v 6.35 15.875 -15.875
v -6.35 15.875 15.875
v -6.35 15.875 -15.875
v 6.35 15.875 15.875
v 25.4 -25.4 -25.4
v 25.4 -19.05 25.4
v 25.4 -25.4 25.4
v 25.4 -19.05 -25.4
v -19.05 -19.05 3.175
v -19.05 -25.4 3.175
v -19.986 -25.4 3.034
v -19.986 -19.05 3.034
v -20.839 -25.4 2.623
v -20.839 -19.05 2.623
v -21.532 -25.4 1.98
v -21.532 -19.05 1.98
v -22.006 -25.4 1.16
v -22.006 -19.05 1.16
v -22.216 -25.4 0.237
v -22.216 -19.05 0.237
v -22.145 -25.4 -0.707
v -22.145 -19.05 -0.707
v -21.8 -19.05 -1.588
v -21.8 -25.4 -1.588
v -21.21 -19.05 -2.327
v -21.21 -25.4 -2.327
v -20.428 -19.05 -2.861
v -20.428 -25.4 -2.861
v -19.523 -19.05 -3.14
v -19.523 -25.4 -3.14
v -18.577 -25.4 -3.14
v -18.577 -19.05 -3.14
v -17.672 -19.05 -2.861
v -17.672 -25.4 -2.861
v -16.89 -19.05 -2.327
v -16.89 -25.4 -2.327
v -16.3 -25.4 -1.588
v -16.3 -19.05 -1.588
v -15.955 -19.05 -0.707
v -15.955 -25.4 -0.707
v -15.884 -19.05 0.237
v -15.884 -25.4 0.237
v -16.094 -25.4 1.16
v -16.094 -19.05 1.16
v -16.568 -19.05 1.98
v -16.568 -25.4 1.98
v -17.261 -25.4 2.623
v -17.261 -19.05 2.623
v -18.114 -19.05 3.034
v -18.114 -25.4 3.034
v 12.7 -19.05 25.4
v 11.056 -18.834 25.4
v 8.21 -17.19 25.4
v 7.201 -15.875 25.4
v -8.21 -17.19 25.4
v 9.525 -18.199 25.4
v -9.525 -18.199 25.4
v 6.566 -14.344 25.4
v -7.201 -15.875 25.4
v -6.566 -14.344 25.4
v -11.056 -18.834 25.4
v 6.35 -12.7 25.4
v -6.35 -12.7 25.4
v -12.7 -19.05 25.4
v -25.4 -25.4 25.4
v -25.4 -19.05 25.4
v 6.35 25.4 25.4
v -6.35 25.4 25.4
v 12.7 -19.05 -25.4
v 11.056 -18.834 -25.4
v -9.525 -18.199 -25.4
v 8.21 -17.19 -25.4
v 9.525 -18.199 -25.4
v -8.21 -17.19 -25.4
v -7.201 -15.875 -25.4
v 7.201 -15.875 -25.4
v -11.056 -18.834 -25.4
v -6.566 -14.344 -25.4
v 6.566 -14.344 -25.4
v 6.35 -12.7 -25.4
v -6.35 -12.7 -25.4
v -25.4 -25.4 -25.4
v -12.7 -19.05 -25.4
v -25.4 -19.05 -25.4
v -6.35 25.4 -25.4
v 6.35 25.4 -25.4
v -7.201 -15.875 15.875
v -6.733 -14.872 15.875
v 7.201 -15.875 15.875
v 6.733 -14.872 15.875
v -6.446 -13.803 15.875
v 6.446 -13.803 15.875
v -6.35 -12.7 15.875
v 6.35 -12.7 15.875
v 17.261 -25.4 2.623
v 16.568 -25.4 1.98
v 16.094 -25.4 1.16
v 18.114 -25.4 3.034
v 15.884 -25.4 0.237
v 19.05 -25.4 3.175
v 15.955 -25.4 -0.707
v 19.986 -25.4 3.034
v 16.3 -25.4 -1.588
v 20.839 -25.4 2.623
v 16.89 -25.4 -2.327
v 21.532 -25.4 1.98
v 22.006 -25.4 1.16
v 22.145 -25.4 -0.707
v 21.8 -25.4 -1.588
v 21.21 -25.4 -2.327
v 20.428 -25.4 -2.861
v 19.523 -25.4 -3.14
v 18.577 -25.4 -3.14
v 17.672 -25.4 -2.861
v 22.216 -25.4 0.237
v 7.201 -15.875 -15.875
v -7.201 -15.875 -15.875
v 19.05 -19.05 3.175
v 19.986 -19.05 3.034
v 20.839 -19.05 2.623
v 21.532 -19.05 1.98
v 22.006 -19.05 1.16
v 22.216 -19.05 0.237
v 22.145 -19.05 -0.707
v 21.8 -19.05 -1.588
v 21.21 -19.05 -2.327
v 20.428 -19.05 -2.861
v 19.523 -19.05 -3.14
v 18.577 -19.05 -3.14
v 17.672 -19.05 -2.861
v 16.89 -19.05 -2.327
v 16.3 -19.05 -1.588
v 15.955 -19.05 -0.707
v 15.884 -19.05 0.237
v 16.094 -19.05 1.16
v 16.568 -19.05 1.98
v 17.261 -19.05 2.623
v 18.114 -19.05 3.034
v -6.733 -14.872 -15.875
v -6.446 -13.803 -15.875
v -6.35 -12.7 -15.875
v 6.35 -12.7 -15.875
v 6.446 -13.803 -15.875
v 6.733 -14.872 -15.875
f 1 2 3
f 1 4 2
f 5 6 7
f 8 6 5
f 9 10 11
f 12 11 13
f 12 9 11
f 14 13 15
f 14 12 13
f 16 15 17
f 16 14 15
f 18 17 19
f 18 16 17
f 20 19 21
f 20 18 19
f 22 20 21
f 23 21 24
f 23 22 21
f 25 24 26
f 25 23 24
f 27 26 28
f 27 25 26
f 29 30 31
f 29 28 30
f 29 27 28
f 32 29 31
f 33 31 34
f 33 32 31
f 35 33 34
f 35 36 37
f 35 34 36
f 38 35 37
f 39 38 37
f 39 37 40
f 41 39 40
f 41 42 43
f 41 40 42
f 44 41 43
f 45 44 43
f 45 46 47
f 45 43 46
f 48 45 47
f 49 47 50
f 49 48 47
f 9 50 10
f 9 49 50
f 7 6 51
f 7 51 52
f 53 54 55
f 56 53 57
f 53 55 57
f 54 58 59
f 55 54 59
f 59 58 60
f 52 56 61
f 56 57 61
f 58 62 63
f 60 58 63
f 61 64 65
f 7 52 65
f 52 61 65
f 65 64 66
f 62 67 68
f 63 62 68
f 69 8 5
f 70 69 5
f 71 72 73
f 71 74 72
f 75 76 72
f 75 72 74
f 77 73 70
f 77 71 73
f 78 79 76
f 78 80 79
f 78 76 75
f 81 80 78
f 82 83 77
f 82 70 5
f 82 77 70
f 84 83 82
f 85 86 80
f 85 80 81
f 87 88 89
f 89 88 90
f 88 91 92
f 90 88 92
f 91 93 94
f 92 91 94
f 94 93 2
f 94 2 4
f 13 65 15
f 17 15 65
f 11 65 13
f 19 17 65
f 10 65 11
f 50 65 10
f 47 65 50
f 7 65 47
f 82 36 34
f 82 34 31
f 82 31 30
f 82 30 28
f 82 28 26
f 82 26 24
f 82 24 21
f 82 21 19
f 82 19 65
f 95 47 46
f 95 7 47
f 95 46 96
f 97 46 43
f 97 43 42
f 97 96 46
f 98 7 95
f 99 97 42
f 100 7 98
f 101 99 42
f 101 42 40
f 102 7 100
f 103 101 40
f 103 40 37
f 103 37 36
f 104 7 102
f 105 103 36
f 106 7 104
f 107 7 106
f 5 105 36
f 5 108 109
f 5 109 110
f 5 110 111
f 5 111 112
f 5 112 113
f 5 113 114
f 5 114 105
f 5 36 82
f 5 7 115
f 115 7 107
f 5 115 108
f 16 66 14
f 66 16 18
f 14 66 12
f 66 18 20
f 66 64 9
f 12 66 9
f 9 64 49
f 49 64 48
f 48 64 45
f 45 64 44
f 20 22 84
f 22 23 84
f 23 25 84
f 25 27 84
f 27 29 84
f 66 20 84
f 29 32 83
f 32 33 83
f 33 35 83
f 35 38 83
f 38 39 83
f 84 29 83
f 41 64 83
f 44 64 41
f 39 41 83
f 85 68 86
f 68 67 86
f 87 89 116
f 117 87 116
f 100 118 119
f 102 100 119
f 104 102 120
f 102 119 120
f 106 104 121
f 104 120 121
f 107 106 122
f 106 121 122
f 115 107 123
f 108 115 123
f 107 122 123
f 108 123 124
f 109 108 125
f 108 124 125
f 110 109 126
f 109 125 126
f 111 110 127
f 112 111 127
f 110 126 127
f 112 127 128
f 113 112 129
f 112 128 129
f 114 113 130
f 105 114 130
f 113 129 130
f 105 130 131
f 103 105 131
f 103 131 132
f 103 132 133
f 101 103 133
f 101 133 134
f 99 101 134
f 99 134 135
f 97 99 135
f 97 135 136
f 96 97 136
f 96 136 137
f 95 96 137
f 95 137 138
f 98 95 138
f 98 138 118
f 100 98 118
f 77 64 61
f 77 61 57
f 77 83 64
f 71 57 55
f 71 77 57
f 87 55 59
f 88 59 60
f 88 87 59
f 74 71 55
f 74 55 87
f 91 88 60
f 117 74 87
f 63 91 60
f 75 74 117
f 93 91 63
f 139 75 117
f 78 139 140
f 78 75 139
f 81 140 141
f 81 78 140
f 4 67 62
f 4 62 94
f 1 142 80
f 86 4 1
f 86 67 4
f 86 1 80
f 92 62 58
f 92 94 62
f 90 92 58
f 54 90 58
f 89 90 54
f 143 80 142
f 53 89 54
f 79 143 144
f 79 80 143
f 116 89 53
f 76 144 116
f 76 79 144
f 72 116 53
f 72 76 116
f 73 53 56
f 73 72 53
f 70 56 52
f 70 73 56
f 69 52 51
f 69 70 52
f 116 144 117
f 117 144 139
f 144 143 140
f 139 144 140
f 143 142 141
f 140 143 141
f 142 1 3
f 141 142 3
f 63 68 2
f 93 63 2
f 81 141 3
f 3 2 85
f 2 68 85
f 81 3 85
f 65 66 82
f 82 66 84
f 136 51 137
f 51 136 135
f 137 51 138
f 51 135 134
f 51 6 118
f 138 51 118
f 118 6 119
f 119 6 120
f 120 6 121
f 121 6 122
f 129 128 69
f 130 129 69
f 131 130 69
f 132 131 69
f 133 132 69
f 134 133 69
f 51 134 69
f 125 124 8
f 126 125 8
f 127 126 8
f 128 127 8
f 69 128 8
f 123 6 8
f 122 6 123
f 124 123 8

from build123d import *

# Parameters (mm, degrees)
SKETCH1_W           = 50.8
SKETCH1_H           = 50.8
SKETCH1_W_2         = 31.75
SKETCH1_H_2         = 31.75
BOSS_EXTRUDE1_DEPTH = 6.35
SKETCH2_W           = 50.8
SKETCH2_H           = 6.35
BOSS_EXTRUDE2_DEPTH = 25.4
FILLET1_R           = 6.35
SKETCH3_R           = 3.175
CUT_EXTRUDE1_DEPTH  = 58.15


with BuildPart() as part:
    # Sketch1 → Boss-Extrude1 (new, symmetric)
    with BuildSketch(Plane(origin=(0, 0, 0), x_dir=(0, 0, -1), z_dir=(1, 0, 0))):
        Rectangle(SKETCH1_W, SKETCH1_H)
        Rectangle(SKETCH1_W_2, SKETCH1_H_2, mode=Mode.SUBTRACT)
    extrude(amount=BOSS_EXTRUDE1_DEPTH, both=True)

    # Sketch2 → Boss-Extrude2 (add, symmetric)
    with BuildSketch(Plane(origin=(0, 0, 0), x_dir=(0, 0, -1), z_dir=(1, 0, 0))):
        with Locations((0, -22.225)):
            Rectangle(SKETCH2_W, SKETCH2_H)
    extrude(amount=BOSS_EXTRUDE2_DEPTH, both=True)

    # Fillet1
    # the kernel refuses this fillet: 6.35 mm, written as the material it adds along each edge
    with BuildSketch(Plane(origin=(-6.35, -19.05, -25.4), x_dir=(0, 1, 0), z_dir=(0, 0, 1))) as fillet1_piece_1_section:
        with BuildLine():
            CenterArc((FILLET1_R, FILLET1_R), FILLET1_R, 180, 90)
            Line((0, FILLET1_R), (0, 0))
            Line((0, 0), (FILLET1_R, 0))
        make_face()
    fillet1_piece_1 = extrude(amount=50.8, mode=Mode.PRIVATE)
    fillet1_piece_1 = split(fillet1_piece_1, bisect_by=Plane(origin=(-6.502453224, -14.838357518, -15.875), z_dir=(0, 0, -1)), keep=Keep.TOP, mode=Mode.PRIVATE)
    fillet1_piece_1 = split(fillet1_piece_1, bisect_by=Plane(origin=(-6.502453224, -15.875, -20.6375), z_dir=(0, 1, 0)), keep=Keep.TOP, mode=Mode.PRIVATE)
    add(fillet1_piece_1)
    with BuildSketch(Plane(origin=(-6.35, -19.05, -25.4), x_dir=(0, 1, 0), z_dir=(0, 0, 1))) as fillet1_piece_2_section:
        with BuildLine():
            CenterArc((FILLET1_R, FILLET1_R), FILLET1_R, 180, 90)
            Line((0, FILLET1_R), (0, 0))
            Line((0, 0), (FILLET1_R, 0))
        make_face()
    fillet1_piece_2 = extrude(amount=50.8, mode=Mode.PRIVATE)
    fillet1_piece_2 = split(fillet1_piece_2, bisect_by=Plane(origin=(-7.970012381, -18.006112297, -15.875), z_dir=(0, 0, -1)), keep=Keep.TOP, mode=Mode.PRIVATE)
    fillet1_piece_2 = split(fillet1_piece_2, bisect_by=Plane(origin=(-7.970012381, -15.875, -20.6375), z_dir=(0, -1, 0)), keep=Keep.TOP, mode=Mode.PRIVATE)
    add(fillet1_piece_2)
    with BuildSketch(Plane(origin=(-6.35, -19.05, -25.4), x_dir=(0, 1, 0), z_dir=(0, 0, 1))) as fillet1_piece_3_section:
        with BuildLine():
            CenterArc((FILLET1_R, FILLET1_R), FILLET1_R, 180, 90)
            Line((0, FILLET1_R), (0, 0))
            Line((0, 0), (FILLET1_R, 0))
        make_face()
    fillet1_piece_3 = extrude(amount=50.8, mode=Mode.PRIVATE)
    fillet1_piece_3 = split(fillet1_piece_3, bisect_by=Plane(origin=(-7.970012381, -18.006112297, -15.875), z_dir=(0, 0, 1)), keep=Keep.TOP, mode=Mode.PRIVATE)
    fillet1_piece_3 = split(fillet1_piece_3, bisect_by=Plane(origin=(-7.970012381, -15.875, 0), z_dir=(0, -1, 0)), keep=Keep.TOP, mode=Mode.PRIVATE)
    fillet1_piece_3 = split(fillet1_piece_3, bisect_by=Plane(origin=(-7.970012381, -18.006112297, 15.875), z_dir=(0, 0, -1)), keep=Keep.TOP, mode=Mode.PRIVATE)
    add(fillet1_piece_3)
    with BuildSketch(Plane(origin=(-6.35, -19.05, -25.4), x_dir=(0, 1, 0), z_dir=(0, 0, 1))) as fillet1_piece_4_section:
        with BuildLine():
            CenterArc((FILLET1_R, FILLET1_R), FILLET1_R, 180, 90)
            Line((0, FILLET1_R), (0, 0))
            Line((0, 0), (FILLET1_R, 0))
        make_face()
    fillet1_piece_4 = extrude(amount=50.8, mode=Mode.PRIVATE)
    fillet1_piece_4 = split(fillet1_piece_4, bisect_by=Plane(origin=(-6.502453224, -15.875, 20.6375), z_dir=(0, 1, 0)), keep=Keep.TOP, mode=Mode.PRIVATE)
    fillet1_piece_4 = split(fillet1_piece_4, bisect_by=Plane(origin=(-6.502453224, -14.838357518, 15.875), z_dir=(0, 0, 1)), keep=Keep.TOP, mode=Mode.PRIVATE)
    add(fillet1_piece_4)
    with BuildSketch(Plane(origin=(-6.35, -19.05, -25.4), x_dir=(0, 1, 0), z_dir=(0, 0, 1))) as fillet1_piece_5_section:
        with BuildLine():
            CenterArc((FILLET1_R, FILLET1_R), FILLET1_R, 180, 90)
            Line((0, FILLET1_R), (0, 0))
            Line((0, 0), (FILLET1_R, 0))
        make_face()
    fillet1_piece_5 = extrude(amount=50.8, mode=Mode.PRIVATE)
    fillet1_piece_5 = split(fillet1_piece_5, bisect_by=Plane(origin=(-7.970012381, -15.875, 20.6375), z_dir=(0, -1, 0)), keep=Keep.TOP, mode=Mode.PRIVATE)
    fillet1_piece_5 = split(fillet1_piece_5, bisect_by=Plane(origin=(-7.970012381, -18.006112297, 15.875), z_dir=(0, 0, 1)), keep=Keep.TOP, mode=Mode.PRIVATE)
    add(fillet1_piece_5)
    with BuildSketch(Plane(origin=(6.35, -19.05, -25.4), x_dir=(1, 0, 0), z_dir=(0, 0, 1))) as fillet1_piece_6_section:
        with BuildLine():
            CenterArc((FILLET1_R, FILLET1_R), FILLET1_R, 180, 90)
            Line((0, FILLET1_R), (0, 0))
            Line((0, 0), (FILLET1_R, 0))
        make_face()
    fillet1_piece_6 = extrude(amount=50.8, mode=Mode.PRIVATE)
    fillet1_piece_6 = split(fillet1_piece_6, bisect_by=Plane(origin=(7.970012381, -15.875, -20.6375), z_dir=(0, -1, 0)), keep=Keep.TOP, mode=Mode.PRIVATE)
    fillet1_piece_6 = split(fillet1_piece_6, bisect_by=Plane(origin=(7.970012381, -18.006112297, -15.875), z_dir=(0, 0, -1)), keep=Keep.TOP, mode=Mode.PRIVATE)
    add(fillet1_piece_6)
    with BuildSketch(Plane(origin=(6.35, -19.05, -25.4), x_dir=(1, 0, 0), z_dir=(0, 0, 1))) as fillet1_piece_7_section:
        with BuildLine():
            CenterArc((FILLET1_R, FILLET1_R), FILLET1_R, 180, 90)
            Line((0, FILLET1_R), (0, 0))
            Line((0, 0), (FILLET1_R, 0))
        make_face()
    fillet1_piece_7 = extrude(amount=50.8, mode=Mode.PRIVATE)
    fillet1_piece_7 = split(fillet1_piece_7, bisect_by=Plane(origin=(6.502453224, -15.875, -20.6375), z_dir=(0, 1, 0)), keep=Keep.TOP, mode=Mode.PRIVATE)
    fillet1_piece_7 = split(fillet1_piece_7, bisect_by=Plane(origin=(6.502453224, -14.838357518, -15.875), z_dir=(0, 0, -1)), keep=Keep.TOP, mode=Mode.PRIVATE)
    add(fillet1_piece_7)
    with BuildSketch(Plane(origin=(6.35, -19.05, -25.4), x_dir=(1, 0, 0), z_dir=(0, 0, 1))) as fillet1_piece_8_section:
        with BuildLine():
            CenterArc((FILLET1_R, FILLET1_R), FILLET1_R, 180, 90)
            Line((0, FILLET1_R), (0, 0))
            Line((0, 0), (FILLET1_R, 0))
        make_face()
    fillet1_piece_8 = extrude(amount=50.8, mode=Mode.PRIVATE)
    fillet1_piece_8 = split(fillet1_piece_8, bisect_by=Plane(origin=(7.970012381, -18.006112297, 15.875), z_dir=(0, 0, -1)), keep=Keep.TOP, mode=Mode.PRIVATE)
    fillet1_piece_8 = split(fillet1_piece_8, bisect_by=Plane(origin=(7.970012381, -15.875, 0), z_dir=(0, -1, 0)), keep=Keep.TOP, mode=Mode.PRIVATE)
    fillet1_piece_8 = split(fillet1_piece_8, bisect_by=Plane(origin=(7.970012381, -18.006112297, -15.875), z_dir=(0, 0, 1)), keep=Keep.TOP, mode=Mode.PRIVATE)
    add(fillet1_piece_8)
    with BuildSketch(Plane(origin=(6.35, -19.05, -25.4), x_dir=(1, 0, 0), z_dir=(0, 0, 1))) as fillet1_piece_9_section:
        with BuildLine():
            CenterArc((FILLET1_R, FILLET1_R), FILLET1_R, 180, 90)
            Line((0, FILLET1_R), (0, 0))
            Line((0, 0), (FILLET1_R, 0))
        make_face()
    fillet1_piece_9 = extrude(amount=50.8, mode=Mode.PRIVATE)
    fillet1_piece_9 = split(fillet1_piece_9, bisect_by=Plane(origin=(7.970012381, -18.006112297, 15.875), z_dir=(0, 0, 1)), keep=Keep.TOP, mode=Mode.PRIVATE)
    fillet1_piece_9 = split(fillet1_piece_9, bisect_by=Plane(origin=(7.970012381, -15.875, 20.6375), z_dir=(0, -1, 0)), keep=Keep.TOP, mode=Mode.PRIVATE)
    add(fillet1_piece_9)
    with BuildSketch(Plane(origin=(6.35, -19.05, -25.4), x_dir=(1, 0, 0), z_dir=(0, 0, 1))) as fillet1_piece_10_section:
        with BuildLine():
            CenterArc((FILLET1_R, FILLET1_R), FILLET1_R, 180, 90)
            Line((0, FILLET1_R), (0, 0))
            Line((0, 0), (FILLET1_R, 0))
        make_face()
    fillet1_piece_10 = extrude(amount=50.8, mode=Mode.PRIVATE)
    fillet1_piece_10 = split(fillet1_piece_10, bisect_by=Plane(origin=(6.502453224, -14.838357518, 15.875), z_dir=(0, 0, 1)), keep=Keep.TOP, mode=Mode.PRIVATE)
    fillet1_piece_10 = split(fillet1_piece_10, bisect_by=Plane(origin=(6.502453224, -15.875, 20.6375), z_dir=(0, 1, 0)), keep=Keep.TOP, mode=Mode.PRIVATE)
    add(fillet1_piece_10)

    # Sketch3 → Cut-Extrude1 (cut, through all)
    with BuildSketch(Plane(origin=(0, -19.05, 0), x_dir=(1, 0, 0), z_dir=(0, 1, 0))):
        with Locations(Location((19.05, 0, 0), (0, 0, 270))):
            Circle(SKETCH3_R)
    cut_extrude1 = extrude(amount=-CUT_EXTRUDE1_DEPTH, mode=Mode.SUBTRACT)

    # Mirror1: Cut-Extrude1 across plane
    add(cut_extrude1.mirror(Plane(origin=(0, 0, 0), x_dir=(0, 0, 1), z_dir=(1, 0, 0))), mode=Mode.SUBTRACT)


solid = part.part
